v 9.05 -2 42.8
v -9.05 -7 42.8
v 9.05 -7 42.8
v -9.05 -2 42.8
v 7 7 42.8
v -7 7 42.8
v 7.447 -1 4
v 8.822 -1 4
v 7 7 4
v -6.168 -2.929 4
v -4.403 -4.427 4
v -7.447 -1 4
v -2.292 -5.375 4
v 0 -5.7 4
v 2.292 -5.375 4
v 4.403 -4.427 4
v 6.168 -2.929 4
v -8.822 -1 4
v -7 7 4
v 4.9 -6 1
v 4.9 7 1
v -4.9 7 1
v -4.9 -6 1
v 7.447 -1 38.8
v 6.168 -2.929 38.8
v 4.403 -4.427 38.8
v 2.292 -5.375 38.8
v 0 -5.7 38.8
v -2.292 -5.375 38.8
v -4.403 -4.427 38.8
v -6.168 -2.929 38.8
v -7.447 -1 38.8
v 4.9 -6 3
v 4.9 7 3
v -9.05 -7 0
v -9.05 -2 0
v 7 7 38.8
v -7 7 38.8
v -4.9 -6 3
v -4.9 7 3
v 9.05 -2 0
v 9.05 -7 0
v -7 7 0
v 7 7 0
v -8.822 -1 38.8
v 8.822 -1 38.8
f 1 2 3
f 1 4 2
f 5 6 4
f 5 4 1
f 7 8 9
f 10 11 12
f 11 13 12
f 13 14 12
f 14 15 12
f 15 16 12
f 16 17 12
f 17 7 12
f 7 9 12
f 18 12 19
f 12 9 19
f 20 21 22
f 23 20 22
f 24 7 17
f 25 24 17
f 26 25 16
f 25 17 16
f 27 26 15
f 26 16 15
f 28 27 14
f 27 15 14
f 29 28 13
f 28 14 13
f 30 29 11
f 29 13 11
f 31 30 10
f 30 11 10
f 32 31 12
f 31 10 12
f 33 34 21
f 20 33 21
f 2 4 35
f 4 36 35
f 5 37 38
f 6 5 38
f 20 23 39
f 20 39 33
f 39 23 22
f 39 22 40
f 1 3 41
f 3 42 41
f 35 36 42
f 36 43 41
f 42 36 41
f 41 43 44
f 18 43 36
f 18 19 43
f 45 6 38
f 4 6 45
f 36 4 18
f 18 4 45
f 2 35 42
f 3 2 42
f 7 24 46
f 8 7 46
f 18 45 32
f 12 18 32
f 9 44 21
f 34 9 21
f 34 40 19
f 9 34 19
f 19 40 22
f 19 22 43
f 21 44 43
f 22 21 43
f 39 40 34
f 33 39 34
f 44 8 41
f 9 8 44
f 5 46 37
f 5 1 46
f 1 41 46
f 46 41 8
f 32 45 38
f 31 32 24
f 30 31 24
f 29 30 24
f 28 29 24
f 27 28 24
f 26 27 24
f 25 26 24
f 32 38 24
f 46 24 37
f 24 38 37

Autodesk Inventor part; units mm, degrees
ref_plane "YZ Plane" through (0, 0, 0) normal (1, 0, 0) x (0, 1, 0)
ref_plane "XZ Plane" through (0, 0, 0) normal (0, 1, 0) x (-1, 0, 0)
ref_plane "XY Plane" through (0, 0, 0) normal (0, 0, 1) x (1, 0, 0)
sketch "スケッチ1" plane through (0, 0, 0) normal (0, 0, 1) x (1, 0, 0)
  line L0 (-9.05, -7) -> (9.05, -7)
  line L1 (9.05, -7) -> (9.05, 7)
  line L2 (9.05, 7) -> (-9.05, 7)
  line L3 (-9.05, 7) -> (-9.05, -7)
  line L4 (-9.05, -7) -> (9.05, 7) construction
  line L5 (9.05, -7) -> (-9.05, 7) construction
  point P0 (0, 0)
  dimension "d1" = 14
  dimension "d2" = 18.1
extrude "押し出し1" add sketch "スケッチ1" along normal blind 42.8
sketch "スケッチ2" plane through (0, 0, 42.8) normal (0, 0, 1) x (1, 0, 0)
  line L0 (-9.05, 7) -> (-9.05, -7) projected
  line L1 (-9.05, 7) -> (-7, 7)
  line L2 (-7, 7) -> (-9.05, -2)
  line L3 (9.05, 7) -> (-9.05, 7) projected
  line L4 (-9.05, 7) -> (-9.05, -2)
  line L5 (9.05, -7) -> (9.05, 7) projected
  line L6 (9.05, 7) -> (9.05, -2)
  line L7 (9.05, -2) -> (7, 7)
  line L8 (7, 7) -> (9.05, 7)
  line L9 (-9.05, -7) -> (9.05, -7) projected
  point P0 (0, 0)
  dimension "d5" = 14
  dimension "d6" = 5
extrude "押し出し2" cut sketch "スケッチ2" against normal through all contours L1 L2 L0 | L3 L5 L7
sketch "スケッチ3" plane through (-7, 7, 0) normal (0, 1, 0) x (1, 0, 0)
  line L0 (-2.05, 0) -> (-2.05, -42.8) projected
  line L1 (16.05, 0) -> (16.05, -42.8) projected
  line L2 (-2.05, -38.8) -> (16.05, -38.8)
  line L3 (16.05, -38.8) -> (16.05, -4)
  line L4 (16.05, -4) -> (-2.05, -4)
  line L5 (-2.05, -4) -> (-2.05, -38.8)
  line L6 (14, 0) -> (0, 0) projected
  line L7 (14, -42.8) -> (0, -42.8) projected
  point P0 (7, 0)
  dimension "d9" = 4
  dimension "d10" = 4
extrude "押し出し3" cut sketch "スケッチ3" against normal blind 8
sketch "スケッチ4" plane through (-7, 7, 4) normal (0, 0, 1) x (1, 0, 0)
  circle A0 centre (7, -4.45) radius 8.25
  line L0 (-2.05, -14) -> (16.05, -14) projected
  point P0 (7, -7)
  dimension "d13" = 16.5
  dimension "d14" = 17.8
extrude "押し出し4" cut sketch "スケッチ4" along normal up to surface (34.8 mm away)
sketch "スケッチ5" plane through (-7, 7, 0) normal (0, 1, 0) x (1, 0, 0)
  line L0 (2.1, -3) -> (11.9, -3)
  line L1 (11.9, -3) -> (11.9, -1)
  line L2 (11.9, -1) -> (2.1, -1)
  line L3 (2.1, -1) -> (2.1, -3)
  line L4 (2.1, -3) -> (11.9, -1) construction
  line L5 (11.9, -3) -> (2.1, -1) construction
  line L6 (14, -4) -> (14, 0) projected
  line L7 (14, 0) -> (0, 0) projected
  point P0 (7, 0)
  point P1 (7, -2)
  point P2 (7, -2)
  point P3 (14, -2)
  point P4 (7, -2)
  point P5 (7, 0)
  dimension "d17" = 2
  dimension "d18" = 9.8
extrude "押し出し5" cut sketch "スケッチ5" against normal blind 13
